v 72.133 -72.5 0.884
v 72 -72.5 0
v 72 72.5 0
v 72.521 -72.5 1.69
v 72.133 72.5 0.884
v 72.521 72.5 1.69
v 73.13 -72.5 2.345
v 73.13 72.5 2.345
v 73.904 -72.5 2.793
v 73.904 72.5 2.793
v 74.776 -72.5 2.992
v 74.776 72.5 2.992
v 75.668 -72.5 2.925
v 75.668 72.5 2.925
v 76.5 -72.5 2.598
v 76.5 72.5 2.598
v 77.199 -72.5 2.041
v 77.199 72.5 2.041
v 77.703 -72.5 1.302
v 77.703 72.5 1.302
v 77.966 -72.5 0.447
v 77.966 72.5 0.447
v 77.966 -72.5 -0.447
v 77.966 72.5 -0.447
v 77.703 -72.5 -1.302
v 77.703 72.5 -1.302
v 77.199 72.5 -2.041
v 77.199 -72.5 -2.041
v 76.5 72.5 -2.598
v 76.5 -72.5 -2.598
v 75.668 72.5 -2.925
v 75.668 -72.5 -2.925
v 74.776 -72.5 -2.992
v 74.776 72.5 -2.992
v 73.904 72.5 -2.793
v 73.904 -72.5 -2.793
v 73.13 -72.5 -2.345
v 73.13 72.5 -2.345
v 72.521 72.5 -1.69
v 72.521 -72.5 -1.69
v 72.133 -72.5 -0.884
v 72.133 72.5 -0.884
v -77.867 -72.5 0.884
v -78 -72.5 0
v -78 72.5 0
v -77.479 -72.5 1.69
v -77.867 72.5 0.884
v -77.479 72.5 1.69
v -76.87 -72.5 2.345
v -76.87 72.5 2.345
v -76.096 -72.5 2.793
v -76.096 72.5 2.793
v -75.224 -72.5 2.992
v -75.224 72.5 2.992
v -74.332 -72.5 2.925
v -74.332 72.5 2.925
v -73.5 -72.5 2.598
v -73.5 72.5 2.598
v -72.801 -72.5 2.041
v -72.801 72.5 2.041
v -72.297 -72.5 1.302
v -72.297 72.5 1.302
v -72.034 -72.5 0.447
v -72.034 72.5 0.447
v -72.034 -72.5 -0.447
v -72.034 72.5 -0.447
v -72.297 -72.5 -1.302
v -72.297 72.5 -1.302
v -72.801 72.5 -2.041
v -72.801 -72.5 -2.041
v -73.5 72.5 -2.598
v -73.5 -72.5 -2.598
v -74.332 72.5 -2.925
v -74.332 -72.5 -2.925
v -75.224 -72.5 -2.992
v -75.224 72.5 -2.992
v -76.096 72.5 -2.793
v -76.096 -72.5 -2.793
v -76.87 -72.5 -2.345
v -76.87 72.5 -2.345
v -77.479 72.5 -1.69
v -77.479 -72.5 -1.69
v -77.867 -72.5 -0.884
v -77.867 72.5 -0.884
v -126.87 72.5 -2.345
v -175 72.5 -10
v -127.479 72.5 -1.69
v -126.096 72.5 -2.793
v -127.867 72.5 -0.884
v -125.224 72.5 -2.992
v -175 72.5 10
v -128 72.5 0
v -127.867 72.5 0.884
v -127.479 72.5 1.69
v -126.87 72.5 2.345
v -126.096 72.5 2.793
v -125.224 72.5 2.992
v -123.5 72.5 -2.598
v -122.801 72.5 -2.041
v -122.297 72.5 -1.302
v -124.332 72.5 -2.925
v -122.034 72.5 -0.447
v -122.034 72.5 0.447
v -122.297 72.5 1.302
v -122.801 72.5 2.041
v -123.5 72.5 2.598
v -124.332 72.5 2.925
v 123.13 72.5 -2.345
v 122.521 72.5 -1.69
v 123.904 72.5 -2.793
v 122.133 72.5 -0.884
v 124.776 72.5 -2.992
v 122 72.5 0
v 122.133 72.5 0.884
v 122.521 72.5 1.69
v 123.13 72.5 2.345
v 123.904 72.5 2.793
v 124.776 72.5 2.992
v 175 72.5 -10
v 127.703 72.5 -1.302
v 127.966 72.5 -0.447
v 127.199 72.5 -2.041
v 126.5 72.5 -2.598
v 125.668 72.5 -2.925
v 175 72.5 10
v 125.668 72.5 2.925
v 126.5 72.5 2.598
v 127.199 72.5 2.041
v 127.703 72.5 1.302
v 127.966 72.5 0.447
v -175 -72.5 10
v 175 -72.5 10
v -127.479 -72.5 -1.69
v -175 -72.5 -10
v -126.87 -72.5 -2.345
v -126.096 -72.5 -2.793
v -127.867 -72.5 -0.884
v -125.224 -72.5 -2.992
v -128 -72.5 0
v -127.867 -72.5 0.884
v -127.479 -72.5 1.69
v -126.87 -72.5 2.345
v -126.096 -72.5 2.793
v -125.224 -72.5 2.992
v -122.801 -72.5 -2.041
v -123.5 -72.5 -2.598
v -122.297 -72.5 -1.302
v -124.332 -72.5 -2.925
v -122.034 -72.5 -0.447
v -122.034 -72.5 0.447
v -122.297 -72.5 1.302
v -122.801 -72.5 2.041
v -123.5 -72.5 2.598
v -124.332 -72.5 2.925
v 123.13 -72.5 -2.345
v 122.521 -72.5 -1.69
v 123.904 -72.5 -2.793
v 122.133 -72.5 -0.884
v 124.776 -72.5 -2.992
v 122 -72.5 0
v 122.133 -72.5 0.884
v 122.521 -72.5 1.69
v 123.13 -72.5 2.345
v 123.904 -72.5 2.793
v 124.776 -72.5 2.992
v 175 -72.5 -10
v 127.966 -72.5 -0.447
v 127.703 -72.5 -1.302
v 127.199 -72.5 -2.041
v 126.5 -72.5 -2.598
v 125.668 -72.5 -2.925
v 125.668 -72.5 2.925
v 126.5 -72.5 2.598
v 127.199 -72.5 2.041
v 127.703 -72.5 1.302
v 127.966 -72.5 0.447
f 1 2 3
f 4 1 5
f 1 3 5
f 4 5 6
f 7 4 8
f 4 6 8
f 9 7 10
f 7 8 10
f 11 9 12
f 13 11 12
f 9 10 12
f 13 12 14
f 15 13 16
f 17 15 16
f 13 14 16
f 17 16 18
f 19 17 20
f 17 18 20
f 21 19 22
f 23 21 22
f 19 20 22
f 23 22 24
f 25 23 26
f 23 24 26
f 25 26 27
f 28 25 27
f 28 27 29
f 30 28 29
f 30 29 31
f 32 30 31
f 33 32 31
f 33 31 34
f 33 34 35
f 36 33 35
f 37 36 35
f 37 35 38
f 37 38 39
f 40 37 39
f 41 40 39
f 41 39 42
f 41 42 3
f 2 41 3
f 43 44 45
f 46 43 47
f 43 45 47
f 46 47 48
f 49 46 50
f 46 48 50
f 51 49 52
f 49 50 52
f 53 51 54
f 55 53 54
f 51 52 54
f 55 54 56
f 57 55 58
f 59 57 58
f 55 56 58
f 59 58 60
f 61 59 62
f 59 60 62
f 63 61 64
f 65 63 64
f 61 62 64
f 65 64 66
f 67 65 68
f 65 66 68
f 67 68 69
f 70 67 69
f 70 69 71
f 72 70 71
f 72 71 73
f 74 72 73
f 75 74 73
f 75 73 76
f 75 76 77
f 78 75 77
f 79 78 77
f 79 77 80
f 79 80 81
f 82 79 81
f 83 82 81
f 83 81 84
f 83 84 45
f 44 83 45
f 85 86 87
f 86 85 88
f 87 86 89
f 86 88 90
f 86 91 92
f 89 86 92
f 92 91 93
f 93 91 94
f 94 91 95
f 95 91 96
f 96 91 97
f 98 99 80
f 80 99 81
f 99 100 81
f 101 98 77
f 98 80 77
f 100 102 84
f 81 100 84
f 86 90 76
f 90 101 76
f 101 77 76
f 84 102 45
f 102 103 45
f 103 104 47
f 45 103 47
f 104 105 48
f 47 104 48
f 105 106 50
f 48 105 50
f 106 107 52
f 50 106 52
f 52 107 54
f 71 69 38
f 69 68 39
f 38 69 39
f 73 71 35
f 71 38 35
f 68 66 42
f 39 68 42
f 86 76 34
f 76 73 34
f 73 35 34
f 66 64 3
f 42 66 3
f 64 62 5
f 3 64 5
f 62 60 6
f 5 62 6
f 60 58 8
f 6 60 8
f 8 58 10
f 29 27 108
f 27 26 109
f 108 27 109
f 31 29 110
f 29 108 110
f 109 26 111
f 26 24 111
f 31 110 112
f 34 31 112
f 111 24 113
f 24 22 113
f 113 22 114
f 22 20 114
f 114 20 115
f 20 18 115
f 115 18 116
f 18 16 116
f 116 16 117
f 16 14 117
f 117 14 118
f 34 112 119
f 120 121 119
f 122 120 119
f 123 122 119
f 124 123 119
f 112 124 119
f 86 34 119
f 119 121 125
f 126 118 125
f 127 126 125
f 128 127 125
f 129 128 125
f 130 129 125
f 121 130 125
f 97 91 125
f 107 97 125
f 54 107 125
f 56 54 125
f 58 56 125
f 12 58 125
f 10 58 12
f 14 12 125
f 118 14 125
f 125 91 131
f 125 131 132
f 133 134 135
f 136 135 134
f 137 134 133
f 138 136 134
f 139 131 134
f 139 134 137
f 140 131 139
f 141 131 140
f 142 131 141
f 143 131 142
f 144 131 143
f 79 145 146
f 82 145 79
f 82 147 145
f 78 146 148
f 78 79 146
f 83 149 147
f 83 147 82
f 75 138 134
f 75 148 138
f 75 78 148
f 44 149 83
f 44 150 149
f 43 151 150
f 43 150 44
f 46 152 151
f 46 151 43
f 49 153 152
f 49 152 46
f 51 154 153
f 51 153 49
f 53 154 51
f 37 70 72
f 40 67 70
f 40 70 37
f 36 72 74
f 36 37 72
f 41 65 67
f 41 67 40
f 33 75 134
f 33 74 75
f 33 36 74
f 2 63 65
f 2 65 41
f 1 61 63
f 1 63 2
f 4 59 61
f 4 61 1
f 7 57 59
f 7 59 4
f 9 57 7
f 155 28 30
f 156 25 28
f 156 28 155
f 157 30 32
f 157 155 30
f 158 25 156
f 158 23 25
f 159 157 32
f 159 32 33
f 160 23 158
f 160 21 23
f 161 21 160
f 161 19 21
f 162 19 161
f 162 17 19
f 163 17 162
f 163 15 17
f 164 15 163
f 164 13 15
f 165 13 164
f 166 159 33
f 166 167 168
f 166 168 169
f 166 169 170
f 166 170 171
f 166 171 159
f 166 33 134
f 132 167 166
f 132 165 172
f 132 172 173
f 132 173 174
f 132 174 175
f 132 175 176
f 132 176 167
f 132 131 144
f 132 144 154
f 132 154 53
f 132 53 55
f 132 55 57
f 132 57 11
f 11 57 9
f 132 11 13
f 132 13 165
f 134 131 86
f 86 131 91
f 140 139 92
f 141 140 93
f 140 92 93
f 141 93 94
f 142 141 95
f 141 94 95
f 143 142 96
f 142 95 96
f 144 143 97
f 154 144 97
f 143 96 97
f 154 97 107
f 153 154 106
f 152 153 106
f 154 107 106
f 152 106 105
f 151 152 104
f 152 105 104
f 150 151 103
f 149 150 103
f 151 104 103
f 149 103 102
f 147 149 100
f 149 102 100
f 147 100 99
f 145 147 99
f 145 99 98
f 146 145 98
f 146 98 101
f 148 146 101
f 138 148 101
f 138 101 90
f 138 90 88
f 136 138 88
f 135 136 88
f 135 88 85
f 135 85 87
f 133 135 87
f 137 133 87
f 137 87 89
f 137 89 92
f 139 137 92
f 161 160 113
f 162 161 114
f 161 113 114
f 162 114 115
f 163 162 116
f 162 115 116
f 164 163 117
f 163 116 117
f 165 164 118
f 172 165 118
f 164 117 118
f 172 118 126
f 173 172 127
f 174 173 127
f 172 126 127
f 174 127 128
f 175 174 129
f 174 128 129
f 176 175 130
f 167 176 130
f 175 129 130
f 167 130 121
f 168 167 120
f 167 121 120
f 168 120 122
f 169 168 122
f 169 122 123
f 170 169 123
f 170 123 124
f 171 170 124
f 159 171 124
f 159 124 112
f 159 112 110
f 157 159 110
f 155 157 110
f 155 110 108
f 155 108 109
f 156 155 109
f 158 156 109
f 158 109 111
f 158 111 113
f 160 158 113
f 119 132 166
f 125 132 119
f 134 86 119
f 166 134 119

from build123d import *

# Parameters (mm, degrees)
F0_W     = 350
F0_H     = 145
F1_DEPTH = 10
F3_D     = 6


with BuildPart() as f1:
    # F0 (on Top) → F1 (new body, symmetric)
    with BuildSketch(Plane.XY):
        Rectangle(F0_W, F0_H)
    extrude(amount=F1_DEPTH, both=True)

    # F3 (through all)
    with Locations(Plane.XZ.offset(72.5)):
        with Locations((-125, 0), (-75, 0), (75, 0), (125, 0)):
            Hole(F3_D / 2)


solid = f1.part
